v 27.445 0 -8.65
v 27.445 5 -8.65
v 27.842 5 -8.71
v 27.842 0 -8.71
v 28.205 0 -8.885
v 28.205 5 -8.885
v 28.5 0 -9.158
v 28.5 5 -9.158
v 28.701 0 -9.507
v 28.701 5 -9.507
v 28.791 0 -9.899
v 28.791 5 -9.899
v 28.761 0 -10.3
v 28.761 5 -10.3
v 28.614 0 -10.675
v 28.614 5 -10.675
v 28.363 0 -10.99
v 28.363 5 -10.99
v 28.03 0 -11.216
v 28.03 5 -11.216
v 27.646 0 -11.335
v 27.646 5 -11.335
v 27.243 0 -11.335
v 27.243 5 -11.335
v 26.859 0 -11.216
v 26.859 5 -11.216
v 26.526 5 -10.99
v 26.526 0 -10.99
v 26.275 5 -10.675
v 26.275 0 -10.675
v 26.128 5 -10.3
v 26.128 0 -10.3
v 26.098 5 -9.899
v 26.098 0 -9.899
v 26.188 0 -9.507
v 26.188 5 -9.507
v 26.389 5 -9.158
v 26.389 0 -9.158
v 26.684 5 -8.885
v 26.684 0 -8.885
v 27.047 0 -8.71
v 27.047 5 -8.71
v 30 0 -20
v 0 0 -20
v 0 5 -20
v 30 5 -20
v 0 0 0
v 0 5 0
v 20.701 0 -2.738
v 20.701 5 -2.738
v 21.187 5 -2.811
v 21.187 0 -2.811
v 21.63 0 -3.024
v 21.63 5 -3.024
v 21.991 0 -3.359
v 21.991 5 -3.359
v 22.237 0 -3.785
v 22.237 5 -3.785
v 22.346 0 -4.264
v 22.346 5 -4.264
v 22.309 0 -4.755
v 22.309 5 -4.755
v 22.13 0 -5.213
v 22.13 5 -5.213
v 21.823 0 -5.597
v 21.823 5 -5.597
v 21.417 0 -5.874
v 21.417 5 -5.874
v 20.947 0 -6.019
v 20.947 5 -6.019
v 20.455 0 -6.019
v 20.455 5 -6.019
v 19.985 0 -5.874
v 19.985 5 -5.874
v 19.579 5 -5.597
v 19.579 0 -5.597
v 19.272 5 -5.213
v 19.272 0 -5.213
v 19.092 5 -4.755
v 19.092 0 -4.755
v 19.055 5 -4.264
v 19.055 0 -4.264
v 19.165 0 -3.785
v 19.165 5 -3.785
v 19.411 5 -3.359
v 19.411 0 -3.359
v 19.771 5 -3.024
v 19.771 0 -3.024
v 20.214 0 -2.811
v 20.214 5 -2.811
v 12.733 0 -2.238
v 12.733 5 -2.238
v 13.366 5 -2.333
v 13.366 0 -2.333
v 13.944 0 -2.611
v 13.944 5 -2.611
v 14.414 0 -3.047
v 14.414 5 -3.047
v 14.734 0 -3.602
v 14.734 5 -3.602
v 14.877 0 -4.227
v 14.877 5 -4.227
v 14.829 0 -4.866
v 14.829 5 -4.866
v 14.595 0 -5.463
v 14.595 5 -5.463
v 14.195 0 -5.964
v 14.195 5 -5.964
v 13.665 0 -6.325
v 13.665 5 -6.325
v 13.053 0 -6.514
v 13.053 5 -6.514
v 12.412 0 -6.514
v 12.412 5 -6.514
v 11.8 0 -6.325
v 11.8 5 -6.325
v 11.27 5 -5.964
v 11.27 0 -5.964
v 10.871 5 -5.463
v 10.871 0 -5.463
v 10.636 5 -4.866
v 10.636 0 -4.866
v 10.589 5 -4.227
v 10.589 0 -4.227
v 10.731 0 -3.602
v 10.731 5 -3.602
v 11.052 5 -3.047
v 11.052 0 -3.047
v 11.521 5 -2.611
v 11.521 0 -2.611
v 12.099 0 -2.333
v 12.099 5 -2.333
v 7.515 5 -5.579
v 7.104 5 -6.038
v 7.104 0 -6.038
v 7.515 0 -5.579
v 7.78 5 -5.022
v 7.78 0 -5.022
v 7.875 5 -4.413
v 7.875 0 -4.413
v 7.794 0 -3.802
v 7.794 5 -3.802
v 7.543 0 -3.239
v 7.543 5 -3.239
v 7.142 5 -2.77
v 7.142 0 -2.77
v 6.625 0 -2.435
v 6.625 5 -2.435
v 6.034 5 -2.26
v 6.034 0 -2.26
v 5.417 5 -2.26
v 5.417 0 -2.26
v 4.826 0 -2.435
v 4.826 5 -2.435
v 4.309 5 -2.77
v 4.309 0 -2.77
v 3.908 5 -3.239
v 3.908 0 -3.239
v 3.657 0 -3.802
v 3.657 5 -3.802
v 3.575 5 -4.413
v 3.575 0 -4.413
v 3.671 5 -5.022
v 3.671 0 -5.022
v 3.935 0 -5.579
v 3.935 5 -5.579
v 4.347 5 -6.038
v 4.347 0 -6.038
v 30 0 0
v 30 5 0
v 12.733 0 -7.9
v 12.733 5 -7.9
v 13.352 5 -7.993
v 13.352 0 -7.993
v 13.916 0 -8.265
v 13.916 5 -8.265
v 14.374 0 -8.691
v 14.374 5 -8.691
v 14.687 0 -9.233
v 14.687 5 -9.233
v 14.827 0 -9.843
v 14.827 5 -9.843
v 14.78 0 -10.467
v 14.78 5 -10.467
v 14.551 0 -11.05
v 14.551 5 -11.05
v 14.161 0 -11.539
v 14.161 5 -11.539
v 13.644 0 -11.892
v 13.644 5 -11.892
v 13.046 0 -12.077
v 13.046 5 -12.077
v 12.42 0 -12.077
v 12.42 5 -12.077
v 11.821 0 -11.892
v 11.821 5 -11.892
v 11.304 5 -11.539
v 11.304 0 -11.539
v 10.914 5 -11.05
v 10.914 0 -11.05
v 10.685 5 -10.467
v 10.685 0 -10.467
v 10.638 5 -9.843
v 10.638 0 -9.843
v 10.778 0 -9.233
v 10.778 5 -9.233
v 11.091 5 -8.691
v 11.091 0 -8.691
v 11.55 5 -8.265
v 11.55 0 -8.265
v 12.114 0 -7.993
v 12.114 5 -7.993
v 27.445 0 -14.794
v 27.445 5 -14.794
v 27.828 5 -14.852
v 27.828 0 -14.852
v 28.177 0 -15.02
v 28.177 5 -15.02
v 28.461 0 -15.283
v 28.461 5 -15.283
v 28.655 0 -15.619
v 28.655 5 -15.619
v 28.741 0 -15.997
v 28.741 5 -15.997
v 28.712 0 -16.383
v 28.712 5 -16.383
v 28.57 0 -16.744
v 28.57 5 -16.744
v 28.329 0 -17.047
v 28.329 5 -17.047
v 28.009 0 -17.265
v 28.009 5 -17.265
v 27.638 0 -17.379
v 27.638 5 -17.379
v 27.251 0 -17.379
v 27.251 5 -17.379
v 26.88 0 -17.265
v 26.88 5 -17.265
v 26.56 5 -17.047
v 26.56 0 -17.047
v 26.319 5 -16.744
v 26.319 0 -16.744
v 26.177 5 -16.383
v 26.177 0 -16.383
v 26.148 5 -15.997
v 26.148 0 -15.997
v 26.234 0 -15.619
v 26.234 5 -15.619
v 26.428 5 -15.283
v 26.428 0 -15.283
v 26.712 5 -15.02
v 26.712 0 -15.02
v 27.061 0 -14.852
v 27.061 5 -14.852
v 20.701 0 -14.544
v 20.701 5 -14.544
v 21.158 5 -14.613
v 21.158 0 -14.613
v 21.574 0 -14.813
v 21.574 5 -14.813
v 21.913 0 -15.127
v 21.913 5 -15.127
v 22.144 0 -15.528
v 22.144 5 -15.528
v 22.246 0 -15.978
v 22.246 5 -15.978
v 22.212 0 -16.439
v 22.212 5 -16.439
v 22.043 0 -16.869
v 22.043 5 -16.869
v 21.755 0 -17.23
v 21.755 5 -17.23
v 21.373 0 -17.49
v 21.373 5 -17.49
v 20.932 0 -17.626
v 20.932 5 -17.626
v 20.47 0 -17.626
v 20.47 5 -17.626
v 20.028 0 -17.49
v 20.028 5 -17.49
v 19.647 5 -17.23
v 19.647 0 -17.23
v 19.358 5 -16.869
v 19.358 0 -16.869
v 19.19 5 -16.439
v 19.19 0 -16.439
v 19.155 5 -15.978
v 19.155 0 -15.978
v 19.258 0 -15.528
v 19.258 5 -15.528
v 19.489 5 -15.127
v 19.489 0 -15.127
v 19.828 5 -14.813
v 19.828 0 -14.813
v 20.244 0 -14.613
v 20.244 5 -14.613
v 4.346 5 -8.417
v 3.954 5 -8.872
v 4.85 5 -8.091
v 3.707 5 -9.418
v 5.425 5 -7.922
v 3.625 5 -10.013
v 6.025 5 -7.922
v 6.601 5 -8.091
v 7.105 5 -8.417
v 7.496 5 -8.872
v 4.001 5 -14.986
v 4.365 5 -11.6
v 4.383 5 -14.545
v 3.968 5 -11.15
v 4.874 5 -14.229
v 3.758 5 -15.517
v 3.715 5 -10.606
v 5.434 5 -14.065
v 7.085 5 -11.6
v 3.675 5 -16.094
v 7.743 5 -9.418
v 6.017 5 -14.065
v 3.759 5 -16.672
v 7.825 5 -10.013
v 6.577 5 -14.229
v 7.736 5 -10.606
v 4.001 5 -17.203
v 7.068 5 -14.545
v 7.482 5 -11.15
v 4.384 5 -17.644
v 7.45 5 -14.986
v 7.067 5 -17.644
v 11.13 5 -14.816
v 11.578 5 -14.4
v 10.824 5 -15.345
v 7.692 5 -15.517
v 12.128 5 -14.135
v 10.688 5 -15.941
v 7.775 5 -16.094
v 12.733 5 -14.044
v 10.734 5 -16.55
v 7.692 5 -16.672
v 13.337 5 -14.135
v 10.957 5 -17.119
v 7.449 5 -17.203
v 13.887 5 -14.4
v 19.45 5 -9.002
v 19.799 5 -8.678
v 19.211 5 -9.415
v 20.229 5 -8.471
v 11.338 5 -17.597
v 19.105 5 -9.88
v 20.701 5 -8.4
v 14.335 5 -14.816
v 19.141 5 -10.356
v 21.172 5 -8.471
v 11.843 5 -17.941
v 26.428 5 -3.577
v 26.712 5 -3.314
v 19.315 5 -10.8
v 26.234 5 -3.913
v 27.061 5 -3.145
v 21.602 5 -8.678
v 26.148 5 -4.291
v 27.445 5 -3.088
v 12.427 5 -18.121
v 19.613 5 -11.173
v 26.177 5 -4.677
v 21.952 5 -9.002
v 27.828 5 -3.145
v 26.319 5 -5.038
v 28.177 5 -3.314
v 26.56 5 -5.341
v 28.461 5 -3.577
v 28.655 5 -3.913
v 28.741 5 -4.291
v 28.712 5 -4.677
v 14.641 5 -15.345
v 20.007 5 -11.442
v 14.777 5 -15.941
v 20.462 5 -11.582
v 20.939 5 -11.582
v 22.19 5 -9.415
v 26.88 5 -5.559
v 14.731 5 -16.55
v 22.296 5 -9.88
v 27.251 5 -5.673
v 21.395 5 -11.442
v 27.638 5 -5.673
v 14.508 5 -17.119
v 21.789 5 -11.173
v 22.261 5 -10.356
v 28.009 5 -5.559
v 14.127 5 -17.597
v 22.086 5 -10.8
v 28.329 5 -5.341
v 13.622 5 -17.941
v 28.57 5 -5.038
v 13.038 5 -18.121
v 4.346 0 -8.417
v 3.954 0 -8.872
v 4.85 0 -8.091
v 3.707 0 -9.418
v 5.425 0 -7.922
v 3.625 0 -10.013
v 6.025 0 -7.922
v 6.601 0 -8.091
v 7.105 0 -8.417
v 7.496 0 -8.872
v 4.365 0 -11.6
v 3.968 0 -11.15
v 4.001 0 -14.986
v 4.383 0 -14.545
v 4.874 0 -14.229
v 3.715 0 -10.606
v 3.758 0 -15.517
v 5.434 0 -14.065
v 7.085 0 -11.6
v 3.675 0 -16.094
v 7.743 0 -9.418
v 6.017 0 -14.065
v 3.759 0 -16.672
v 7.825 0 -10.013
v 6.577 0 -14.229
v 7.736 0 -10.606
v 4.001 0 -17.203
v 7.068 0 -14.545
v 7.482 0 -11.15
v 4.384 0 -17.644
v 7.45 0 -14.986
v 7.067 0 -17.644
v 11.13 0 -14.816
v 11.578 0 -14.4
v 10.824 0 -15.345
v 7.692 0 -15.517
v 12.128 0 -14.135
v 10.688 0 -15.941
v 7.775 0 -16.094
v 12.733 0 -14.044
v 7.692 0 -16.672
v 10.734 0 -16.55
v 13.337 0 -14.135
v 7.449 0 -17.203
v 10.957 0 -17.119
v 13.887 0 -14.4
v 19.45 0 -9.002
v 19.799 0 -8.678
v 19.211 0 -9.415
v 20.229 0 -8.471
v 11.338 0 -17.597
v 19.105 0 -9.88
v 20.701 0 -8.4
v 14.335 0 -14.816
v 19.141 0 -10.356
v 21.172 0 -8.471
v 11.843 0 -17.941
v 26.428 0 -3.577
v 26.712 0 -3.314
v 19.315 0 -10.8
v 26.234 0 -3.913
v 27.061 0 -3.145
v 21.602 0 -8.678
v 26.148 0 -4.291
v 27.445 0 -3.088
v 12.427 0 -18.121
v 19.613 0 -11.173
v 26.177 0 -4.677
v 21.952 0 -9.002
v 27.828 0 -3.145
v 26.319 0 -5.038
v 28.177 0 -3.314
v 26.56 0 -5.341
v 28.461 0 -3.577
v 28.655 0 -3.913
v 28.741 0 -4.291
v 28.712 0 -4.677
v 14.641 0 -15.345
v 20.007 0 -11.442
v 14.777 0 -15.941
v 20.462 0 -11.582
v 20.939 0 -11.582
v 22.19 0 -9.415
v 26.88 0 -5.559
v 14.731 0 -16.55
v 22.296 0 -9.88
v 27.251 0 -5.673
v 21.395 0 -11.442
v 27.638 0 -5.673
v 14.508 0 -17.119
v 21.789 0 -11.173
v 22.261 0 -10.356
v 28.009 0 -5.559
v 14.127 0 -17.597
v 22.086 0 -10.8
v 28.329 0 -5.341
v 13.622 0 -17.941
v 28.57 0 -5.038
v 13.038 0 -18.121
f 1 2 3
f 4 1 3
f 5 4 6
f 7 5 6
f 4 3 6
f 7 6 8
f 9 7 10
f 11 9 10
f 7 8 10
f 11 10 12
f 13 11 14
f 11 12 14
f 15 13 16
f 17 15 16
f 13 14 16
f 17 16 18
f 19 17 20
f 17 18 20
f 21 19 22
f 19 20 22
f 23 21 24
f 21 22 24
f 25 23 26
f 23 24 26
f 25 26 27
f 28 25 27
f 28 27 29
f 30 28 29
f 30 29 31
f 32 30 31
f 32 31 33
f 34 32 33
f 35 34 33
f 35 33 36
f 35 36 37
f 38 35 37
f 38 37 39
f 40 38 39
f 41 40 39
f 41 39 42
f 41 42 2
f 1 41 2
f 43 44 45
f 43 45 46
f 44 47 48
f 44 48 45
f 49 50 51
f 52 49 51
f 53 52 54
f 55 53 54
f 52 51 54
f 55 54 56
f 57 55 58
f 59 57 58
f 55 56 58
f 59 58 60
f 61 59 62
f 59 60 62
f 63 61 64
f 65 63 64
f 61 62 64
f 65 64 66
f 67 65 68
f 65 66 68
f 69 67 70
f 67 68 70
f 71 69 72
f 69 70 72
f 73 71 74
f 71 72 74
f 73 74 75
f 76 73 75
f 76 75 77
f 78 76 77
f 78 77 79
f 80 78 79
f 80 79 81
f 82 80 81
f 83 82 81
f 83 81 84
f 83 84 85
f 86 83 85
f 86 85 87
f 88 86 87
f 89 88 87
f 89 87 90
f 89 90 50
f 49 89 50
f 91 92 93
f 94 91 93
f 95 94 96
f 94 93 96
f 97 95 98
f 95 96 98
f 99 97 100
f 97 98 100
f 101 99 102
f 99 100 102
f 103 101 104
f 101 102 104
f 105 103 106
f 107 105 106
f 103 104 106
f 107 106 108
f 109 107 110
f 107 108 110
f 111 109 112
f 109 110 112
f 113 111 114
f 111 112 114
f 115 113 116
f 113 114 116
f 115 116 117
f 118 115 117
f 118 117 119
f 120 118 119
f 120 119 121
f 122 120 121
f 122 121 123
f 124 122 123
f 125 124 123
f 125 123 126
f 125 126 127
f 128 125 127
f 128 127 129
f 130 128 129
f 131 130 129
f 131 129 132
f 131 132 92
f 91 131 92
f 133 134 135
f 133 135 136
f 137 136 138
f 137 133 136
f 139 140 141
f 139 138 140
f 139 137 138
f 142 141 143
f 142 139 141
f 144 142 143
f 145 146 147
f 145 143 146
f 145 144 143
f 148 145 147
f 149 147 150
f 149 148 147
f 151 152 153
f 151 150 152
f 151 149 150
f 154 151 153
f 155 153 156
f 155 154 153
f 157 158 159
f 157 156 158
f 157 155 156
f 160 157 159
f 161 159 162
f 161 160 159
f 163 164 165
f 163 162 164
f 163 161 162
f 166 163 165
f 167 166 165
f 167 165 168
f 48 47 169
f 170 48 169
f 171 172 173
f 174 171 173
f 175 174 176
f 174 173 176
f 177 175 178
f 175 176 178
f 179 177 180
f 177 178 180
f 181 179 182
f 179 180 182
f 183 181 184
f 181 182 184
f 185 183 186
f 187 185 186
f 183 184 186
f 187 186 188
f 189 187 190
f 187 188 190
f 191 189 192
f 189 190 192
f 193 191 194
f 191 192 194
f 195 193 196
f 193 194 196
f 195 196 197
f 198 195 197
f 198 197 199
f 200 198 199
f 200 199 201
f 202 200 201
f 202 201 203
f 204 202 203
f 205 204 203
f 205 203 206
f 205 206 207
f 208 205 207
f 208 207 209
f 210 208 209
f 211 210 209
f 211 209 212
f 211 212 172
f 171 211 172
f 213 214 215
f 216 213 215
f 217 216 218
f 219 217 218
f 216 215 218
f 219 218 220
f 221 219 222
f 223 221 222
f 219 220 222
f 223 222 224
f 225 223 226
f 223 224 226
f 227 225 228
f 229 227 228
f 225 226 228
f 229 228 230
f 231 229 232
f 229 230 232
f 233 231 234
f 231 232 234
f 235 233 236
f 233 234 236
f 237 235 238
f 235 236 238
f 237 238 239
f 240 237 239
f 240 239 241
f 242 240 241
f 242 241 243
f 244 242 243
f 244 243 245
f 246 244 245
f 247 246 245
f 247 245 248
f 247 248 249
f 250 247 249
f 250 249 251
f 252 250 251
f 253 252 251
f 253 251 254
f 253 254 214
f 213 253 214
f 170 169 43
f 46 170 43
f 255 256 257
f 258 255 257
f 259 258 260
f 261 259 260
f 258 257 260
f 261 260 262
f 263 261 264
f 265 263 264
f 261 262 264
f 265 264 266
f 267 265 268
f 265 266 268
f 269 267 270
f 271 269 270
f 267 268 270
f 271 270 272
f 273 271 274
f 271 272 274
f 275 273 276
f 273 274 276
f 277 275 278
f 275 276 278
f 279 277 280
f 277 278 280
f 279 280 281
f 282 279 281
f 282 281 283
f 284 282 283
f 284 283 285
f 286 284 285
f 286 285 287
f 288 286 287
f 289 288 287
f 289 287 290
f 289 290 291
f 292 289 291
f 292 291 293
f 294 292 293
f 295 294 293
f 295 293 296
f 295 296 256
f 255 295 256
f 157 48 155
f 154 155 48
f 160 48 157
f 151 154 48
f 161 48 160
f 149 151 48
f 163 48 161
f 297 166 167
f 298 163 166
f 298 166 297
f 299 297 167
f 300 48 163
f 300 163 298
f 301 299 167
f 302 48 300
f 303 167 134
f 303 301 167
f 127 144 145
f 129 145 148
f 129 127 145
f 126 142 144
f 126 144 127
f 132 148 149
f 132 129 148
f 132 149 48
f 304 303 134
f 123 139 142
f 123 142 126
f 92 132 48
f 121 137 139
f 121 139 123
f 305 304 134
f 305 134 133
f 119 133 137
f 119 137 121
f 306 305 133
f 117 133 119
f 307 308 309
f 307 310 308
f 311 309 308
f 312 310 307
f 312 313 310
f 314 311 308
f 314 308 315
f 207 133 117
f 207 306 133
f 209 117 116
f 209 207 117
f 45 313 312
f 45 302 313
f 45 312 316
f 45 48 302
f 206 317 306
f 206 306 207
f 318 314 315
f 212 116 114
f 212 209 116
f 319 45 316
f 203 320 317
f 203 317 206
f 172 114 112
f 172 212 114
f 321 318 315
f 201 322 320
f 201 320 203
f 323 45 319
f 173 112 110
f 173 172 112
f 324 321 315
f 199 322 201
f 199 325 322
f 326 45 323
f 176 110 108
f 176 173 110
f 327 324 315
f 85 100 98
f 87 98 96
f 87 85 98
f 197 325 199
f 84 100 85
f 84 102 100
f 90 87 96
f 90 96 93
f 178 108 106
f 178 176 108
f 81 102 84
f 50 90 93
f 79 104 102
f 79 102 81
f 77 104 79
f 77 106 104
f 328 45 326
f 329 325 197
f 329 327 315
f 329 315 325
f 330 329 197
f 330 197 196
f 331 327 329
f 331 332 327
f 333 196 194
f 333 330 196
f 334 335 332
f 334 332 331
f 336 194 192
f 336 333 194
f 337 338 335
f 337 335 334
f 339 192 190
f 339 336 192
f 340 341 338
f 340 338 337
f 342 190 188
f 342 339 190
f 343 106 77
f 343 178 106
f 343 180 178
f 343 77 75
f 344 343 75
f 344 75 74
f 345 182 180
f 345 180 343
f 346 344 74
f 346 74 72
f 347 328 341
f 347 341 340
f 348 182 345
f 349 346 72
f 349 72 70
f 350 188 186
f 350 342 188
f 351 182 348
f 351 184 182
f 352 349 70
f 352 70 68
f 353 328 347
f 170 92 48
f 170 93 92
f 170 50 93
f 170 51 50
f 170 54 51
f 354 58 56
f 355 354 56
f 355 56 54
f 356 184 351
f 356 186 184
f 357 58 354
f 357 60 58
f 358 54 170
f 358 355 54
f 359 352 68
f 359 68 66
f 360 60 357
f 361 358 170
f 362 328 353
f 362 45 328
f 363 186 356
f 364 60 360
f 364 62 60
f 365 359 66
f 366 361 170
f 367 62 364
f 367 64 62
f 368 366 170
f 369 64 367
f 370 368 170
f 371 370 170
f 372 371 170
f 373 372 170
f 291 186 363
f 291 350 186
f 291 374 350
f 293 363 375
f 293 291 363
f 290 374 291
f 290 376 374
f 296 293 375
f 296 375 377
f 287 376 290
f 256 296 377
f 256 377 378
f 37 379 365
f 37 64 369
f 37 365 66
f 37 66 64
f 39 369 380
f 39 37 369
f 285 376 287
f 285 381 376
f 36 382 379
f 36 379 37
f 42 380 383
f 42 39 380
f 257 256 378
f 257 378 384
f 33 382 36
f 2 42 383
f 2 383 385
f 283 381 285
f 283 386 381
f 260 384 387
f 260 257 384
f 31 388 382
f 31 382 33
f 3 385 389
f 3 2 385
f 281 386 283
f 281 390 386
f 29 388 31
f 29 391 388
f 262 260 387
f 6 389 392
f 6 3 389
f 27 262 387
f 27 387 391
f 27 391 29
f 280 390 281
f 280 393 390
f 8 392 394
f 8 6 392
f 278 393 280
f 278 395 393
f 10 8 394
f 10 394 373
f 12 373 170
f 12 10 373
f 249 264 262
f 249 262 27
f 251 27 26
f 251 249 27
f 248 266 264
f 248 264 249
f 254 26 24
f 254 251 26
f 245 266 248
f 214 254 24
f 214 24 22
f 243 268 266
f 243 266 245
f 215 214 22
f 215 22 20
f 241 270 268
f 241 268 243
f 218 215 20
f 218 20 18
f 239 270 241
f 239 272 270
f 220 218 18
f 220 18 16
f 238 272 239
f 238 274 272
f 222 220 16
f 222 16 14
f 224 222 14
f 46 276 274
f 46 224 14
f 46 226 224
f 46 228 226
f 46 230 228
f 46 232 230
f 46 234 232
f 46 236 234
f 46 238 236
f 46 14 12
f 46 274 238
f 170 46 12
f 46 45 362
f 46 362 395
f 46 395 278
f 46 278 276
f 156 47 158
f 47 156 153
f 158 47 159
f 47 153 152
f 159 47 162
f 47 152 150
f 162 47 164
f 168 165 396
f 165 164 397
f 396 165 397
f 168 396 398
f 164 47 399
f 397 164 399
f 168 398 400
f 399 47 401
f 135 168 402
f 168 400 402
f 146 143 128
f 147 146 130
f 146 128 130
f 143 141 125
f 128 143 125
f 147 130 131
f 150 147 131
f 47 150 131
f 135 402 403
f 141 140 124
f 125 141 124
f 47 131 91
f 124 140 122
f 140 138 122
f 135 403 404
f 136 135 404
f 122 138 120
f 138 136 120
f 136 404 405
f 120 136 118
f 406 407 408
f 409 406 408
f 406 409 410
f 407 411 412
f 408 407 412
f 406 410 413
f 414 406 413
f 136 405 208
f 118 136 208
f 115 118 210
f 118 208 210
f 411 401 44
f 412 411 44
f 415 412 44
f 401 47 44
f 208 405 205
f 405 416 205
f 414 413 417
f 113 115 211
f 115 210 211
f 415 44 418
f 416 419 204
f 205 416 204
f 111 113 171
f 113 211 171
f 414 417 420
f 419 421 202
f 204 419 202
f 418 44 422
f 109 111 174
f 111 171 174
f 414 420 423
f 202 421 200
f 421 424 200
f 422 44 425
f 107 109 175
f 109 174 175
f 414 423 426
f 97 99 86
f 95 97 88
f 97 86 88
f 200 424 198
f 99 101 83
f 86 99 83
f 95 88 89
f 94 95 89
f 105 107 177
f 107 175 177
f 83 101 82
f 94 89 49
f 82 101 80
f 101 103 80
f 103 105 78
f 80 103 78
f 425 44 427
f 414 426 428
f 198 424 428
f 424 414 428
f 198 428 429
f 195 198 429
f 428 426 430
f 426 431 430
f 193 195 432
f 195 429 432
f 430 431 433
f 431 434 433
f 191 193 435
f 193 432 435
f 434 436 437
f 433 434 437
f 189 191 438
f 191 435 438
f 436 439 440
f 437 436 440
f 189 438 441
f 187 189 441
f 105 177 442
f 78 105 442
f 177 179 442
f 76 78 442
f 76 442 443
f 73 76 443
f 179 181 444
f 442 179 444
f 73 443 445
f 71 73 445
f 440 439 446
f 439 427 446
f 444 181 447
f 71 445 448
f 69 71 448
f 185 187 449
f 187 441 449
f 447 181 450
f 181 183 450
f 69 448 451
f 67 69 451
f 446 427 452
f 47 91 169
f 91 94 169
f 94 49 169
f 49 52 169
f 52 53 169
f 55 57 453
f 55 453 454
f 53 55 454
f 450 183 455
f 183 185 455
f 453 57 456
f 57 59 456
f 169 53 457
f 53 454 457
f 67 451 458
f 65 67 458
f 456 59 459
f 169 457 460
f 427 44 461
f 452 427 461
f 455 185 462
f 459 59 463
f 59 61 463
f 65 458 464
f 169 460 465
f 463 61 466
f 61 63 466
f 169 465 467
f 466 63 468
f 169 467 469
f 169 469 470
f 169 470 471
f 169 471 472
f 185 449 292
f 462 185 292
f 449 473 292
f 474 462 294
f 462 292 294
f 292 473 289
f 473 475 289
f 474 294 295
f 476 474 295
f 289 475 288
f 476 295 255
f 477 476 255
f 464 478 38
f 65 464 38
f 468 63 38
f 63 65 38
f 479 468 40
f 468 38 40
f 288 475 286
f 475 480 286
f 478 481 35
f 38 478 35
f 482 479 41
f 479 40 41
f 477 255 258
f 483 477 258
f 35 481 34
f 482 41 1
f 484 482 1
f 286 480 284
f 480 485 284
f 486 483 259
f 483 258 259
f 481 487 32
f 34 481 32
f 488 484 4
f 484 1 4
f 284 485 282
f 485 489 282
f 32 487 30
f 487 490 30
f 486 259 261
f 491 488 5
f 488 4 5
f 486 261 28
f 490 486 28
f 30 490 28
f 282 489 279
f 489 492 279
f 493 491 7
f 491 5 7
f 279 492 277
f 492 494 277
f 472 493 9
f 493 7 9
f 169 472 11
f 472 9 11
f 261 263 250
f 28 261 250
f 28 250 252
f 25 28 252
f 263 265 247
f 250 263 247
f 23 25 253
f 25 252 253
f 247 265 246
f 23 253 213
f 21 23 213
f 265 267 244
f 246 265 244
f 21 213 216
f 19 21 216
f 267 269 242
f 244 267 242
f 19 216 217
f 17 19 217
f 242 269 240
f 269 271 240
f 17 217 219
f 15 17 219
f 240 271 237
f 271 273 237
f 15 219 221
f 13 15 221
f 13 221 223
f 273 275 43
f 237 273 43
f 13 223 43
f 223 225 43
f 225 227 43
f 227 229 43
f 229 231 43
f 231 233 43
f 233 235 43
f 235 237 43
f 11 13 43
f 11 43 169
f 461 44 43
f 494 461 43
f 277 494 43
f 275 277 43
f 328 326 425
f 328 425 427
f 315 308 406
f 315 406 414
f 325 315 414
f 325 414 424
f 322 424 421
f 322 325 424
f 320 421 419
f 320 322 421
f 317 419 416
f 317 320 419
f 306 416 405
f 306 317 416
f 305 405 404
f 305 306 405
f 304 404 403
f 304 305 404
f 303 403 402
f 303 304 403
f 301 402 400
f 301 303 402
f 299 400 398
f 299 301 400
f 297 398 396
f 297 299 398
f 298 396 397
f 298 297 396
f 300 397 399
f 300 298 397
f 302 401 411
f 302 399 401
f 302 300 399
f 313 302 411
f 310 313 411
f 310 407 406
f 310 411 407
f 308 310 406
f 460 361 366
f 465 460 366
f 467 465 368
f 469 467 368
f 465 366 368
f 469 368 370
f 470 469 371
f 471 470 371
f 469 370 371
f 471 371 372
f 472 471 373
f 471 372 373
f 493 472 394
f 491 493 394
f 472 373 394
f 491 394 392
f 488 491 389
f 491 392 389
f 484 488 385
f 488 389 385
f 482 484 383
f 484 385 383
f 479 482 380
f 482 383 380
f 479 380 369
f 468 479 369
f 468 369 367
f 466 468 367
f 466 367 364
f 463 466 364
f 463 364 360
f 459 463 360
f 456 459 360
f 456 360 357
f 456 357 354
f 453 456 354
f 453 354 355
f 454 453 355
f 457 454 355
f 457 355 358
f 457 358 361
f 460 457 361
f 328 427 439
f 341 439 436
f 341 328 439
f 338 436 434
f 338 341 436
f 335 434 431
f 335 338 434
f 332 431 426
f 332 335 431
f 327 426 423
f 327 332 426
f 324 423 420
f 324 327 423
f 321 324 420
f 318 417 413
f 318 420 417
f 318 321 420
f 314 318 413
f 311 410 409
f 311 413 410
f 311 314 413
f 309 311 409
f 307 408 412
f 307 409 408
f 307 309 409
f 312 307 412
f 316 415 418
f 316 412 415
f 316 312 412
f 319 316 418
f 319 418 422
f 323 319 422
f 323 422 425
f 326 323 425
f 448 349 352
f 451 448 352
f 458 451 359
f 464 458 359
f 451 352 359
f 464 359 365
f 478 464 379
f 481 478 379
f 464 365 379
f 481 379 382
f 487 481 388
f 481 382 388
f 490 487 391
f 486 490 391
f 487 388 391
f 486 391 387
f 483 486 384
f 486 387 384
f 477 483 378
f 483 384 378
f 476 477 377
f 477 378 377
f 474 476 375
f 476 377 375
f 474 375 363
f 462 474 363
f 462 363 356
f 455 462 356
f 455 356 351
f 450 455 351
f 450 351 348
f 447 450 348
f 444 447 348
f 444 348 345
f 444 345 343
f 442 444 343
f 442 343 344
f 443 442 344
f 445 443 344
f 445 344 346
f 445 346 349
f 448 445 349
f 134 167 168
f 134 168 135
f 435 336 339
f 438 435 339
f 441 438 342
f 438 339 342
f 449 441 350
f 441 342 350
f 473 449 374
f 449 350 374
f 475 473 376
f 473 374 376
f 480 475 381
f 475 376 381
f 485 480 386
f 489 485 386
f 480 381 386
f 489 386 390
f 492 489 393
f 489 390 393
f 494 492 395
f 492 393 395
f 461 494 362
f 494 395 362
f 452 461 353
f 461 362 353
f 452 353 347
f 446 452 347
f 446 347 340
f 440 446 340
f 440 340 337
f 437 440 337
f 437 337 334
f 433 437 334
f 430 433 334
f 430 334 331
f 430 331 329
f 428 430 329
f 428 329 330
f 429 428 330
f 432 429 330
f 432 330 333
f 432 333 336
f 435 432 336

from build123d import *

# Parameters (mm, degrees)
SKETCH2_W           = 30
SKETCH2_H           = 20
BOSS_EXTRUDE1_DEPTH = 5
SKETCH5_R           = 1.35
SKETCH5_R_2         = 1.6
SKETCH5_R_3         = 2.1
SKETCH5_R_4         = 1.55
SKETCH5_R_5         = 1.3
SKETCH5_R_6         = 2.05
SKETCH5_R_7         = 1.65
SKETCH5_R_8         = 2.15
CUT_EXTRUDE3_DEPTH  = 37.400549446


with BuildPart() as part:
    # Sketch2 → Boss-Extrude1 (new body)
    with BuildSketch(Plane(origin=(0, 0, 0), x_dir=(1, 0, 0), z_dir=(0, 1, 0))):
        with Locations((15, 10)):
            Rectangle(SKETCH2_W, SKETCH2_H)
    extrude(amount=BOSS_EXTRUDE1_DEPTH)

    # Sketch5 → Cut-Extrude3 (cut, through all)
    with BuildSketch(Plane(origin=(0, 5, 0), x_dir=(1, 0, 0), z_dir=(0, 1, 0))):
        with Locations((27.444530449, 10)):
            Circle(SKETCH5_R)
        with Locations((20.700795765, 10)):
            Circle(SKETCH5_R_2)
        with Locations((12.732583582, 10)):
            Circle(SKETCH5_R_3)
        with Locations((20.700795765, 16.093784601)):
            Circle(SKETCH5_R_4)
        with Locations((27.444530449, 16.093784601)):
            Circle(SKETCH5_R_5)
        with Locations((12.732583582, 16.093784601)):
            Circle(SKETCH5_R_6)
        with Locations((20.700795765, 4.387736866)):
            Circle(SKETCH5_R_7)
        with Locations((27.444530449, 4.387736866)):
            Circle(SKETCH5_R_5)
        with Locations((12.732583582, 4.387736866)):
            Circle(SKETCH5_R_8)
        with BuildLine():
            Line((4.365184557, 11.6), (7.085478659, 11.6))
            ThreePointArc((7.085478659, 11.6), (5.725331608, 7.9), (4.365184557, 11.6))
        make_face()
        with BuildLine():
            Line((4.346926733, 6.037736866), (7.103736483, 6.037736866))
            ThreePointArc((7.103736483, 6.037736866), (5.725331608, 2.237736866), (4.346926733, 6.037736866))
        make_face()
        with BuildLine():
            Line((4.383690822, 17.643784601), (7.066972395, 17.643784601))
            ThreePointArc((7.066972395, 17.643784601), (5.725331608, 14.043784601), (4.383690822, 17.643784601))
        make_face()
    extrude(amount=-CUT_EXTRUDE3_DEPTH, mode=Mode.SUBTRACT)


solid = part.part
